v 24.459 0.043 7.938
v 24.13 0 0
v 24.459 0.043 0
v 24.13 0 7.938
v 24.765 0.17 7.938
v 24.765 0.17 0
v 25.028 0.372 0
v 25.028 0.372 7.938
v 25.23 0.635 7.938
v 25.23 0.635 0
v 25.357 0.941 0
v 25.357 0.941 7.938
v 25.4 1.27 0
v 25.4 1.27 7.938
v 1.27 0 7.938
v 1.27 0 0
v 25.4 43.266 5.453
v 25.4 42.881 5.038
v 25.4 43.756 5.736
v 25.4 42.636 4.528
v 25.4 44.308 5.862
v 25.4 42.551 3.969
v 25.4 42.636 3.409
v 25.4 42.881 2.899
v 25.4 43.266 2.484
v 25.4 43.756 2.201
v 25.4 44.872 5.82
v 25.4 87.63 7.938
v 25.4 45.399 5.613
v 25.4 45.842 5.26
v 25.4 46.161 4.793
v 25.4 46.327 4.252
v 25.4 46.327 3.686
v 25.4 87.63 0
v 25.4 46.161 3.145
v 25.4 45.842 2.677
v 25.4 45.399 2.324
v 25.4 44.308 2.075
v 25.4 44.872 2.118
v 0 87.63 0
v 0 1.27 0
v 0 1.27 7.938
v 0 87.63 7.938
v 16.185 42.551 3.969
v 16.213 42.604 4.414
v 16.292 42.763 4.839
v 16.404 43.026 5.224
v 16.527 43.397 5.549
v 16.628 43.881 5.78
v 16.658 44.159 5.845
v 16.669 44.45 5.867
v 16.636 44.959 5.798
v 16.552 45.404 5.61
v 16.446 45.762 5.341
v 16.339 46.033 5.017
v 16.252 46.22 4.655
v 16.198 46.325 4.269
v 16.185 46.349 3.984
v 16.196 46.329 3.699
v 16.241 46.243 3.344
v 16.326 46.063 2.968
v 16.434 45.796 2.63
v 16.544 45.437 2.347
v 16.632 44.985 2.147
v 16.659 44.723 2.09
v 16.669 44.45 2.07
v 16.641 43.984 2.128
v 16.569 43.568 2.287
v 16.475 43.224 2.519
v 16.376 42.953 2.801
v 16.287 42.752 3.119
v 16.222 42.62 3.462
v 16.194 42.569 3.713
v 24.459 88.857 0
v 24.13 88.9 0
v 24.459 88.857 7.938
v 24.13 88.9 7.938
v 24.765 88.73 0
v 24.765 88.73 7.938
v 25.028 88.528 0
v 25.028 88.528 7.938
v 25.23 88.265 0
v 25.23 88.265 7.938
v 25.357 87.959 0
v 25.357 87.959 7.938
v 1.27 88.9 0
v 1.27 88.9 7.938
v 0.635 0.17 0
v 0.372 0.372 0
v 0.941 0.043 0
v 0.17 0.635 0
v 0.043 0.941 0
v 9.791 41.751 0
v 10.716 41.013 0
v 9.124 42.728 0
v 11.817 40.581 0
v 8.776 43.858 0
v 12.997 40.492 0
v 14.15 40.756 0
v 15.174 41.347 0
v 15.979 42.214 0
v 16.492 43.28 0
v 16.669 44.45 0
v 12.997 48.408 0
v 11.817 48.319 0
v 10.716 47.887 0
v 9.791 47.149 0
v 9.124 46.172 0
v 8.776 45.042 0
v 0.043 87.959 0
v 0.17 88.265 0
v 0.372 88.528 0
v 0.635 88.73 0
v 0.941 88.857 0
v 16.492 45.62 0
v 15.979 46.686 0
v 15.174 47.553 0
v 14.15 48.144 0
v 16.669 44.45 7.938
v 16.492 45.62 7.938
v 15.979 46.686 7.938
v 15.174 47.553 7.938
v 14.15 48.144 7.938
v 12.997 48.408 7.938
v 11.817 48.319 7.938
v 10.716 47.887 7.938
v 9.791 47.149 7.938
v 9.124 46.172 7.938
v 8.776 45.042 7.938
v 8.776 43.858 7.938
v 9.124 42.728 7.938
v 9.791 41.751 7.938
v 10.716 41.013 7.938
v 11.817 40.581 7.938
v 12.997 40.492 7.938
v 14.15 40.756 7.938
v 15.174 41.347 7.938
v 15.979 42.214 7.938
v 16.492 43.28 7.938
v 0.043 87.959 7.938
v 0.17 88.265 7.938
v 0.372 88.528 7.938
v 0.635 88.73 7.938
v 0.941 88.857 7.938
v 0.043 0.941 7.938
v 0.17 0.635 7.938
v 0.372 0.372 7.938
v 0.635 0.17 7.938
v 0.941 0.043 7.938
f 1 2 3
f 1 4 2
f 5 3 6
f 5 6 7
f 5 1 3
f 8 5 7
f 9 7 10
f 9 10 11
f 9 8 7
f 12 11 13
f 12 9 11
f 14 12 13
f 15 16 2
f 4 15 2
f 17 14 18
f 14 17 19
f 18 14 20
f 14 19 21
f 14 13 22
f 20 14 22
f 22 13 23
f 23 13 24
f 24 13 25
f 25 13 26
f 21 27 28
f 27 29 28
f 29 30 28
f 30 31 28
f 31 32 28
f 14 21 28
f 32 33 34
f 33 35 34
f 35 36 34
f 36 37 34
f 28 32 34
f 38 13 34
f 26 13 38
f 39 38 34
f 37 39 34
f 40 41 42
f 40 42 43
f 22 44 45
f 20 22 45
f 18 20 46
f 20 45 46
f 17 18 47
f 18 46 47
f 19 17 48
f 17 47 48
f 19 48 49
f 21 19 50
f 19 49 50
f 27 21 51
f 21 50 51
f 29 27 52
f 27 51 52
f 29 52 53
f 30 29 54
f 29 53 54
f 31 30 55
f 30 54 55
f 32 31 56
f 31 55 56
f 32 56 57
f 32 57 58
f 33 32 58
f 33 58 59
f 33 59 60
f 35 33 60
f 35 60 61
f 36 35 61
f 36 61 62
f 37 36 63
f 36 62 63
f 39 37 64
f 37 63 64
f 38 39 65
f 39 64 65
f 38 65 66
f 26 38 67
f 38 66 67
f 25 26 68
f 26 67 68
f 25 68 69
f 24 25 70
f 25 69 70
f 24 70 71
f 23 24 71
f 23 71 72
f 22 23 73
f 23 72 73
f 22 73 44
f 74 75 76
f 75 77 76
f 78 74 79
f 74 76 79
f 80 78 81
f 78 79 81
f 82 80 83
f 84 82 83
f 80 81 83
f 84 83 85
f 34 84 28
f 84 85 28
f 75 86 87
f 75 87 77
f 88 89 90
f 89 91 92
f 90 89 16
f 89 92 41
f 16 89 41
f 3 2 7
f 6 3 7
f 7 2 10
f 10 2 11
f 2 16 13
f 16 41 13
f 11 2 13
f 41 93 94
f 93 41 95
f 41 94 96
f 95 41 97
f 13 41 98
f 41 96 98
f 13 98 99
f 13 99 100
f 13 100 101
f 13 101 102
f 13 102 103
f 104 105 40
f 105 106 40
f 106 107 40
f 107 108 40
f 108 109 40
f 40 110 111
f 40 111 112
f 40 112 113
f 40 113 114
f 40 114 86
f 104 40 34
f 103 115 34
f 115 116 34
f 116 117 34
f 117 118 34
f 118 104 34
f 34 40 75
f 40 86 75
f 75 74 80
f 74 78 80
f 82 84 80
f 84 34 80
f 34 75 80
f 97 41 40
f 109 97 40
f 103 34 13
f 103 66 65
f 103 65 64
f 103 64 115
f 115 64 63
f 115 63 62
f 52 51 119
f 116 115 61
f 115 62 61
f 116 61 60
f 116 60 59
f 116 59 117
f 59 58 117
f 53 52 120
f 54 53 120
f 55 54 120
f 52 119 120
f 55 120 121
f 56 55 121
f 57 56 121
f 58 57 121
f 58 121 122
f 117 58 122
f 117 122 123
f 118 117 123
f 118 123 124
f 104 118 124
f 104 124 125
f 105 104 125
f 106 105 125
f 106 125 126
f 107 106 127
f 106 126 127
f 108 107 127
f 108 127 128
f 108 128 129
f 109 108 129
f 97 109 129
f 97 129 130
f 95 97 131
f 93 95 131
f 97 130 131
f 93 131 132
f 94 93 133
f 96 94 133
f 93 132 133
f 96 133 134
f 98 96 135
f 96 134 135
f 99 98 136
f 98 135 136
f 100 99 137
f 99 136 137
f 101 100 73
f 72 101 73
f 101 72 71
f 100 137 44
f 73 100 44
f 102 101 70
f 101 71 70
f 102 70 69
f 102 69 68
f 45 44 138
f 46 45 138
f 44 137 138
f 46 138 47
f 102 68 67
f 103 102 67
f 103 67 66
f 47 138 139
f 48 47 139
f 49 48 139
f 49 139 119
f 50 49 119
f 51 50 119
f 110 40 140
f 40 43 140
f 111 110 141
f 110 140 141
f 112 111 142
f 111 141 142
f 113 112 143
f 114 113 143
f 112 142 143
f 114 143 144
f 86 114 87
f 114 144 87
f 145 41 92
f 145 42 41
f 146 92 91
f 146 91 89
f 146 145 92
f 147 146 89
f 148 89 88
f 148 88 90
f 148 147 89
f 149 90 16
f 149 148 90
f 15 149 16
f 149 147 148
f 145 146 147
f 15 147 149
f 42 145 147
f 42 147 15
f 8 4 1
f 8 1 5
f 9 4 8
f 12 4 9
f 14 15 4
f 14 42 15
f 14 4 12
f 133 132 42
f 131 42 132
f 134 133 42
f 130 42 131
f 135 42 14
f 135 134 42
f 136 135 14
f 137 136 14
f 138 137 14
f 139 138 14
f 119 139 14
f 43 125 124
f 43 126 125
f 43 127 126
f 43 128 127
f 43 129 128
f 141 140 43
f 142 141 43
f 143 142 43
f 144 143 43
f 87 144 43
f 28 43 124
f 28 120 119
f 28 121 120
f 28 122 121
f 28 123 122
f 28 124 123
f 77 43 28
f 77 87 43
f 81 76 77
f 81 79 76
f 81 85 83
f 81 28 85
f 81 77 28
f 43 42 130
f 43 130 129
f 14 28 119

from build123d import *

# Parameters (mm, degrees)
F0_W     = 25.4
F0_H     = 88.9
F1_DEPTH = 7.9375
F2_R     = 3.96875
F3_DEPTH = 7.9375
F5_D     = 3.7973
F5_DEPTH = 12.7
F5_TIP   = 1.1408240143
F6_R     = 1.27


with BuildPart() as f1:
    # F0 (on Top) → F1 (new body)
    with BuildSketch(Plane.XY):
        with Locations((12.7, 44.45)):
            Rectangle(F0_W, F0_H)
    extrude(amount=F1_DEPTH)

    # F2 (on face) → F3 (cut, through all)
    with BuildSketch(Plane.XY.offset(7.9375)):
        with Locations((12.7, 44.45)):
            Circle(F2_R)
    extrude(amount=-F3_DEPTH, mode=Mode.SUBTRACT)

    # F5
    with Locations(Plane.YZ.offset(25.4)):
        with Locations((44.45, 3.96875)):
            Hole(F5_D / 2, depth=F5_DEPTH)
            with Locations((0, 0, -(F5_DEPTH + F5_TIP / 2))):  # 118° drill point
                Cone(0, F5_D / 2, F5_TIP, mode=Mode.SUBTRACT)

    # F6
    f6_edges = [f1.edges().sort_by_distance(p)[0] for p in [
        (25.4, 88.9, 3.96875),
        (0, 88.9, 3.96875),
        (25.4, 0, 3.96875),
        (0, 0, 3.96875),
    ]]
    fillet(f6_edges, radius=F6_R)


solid = f1.part
